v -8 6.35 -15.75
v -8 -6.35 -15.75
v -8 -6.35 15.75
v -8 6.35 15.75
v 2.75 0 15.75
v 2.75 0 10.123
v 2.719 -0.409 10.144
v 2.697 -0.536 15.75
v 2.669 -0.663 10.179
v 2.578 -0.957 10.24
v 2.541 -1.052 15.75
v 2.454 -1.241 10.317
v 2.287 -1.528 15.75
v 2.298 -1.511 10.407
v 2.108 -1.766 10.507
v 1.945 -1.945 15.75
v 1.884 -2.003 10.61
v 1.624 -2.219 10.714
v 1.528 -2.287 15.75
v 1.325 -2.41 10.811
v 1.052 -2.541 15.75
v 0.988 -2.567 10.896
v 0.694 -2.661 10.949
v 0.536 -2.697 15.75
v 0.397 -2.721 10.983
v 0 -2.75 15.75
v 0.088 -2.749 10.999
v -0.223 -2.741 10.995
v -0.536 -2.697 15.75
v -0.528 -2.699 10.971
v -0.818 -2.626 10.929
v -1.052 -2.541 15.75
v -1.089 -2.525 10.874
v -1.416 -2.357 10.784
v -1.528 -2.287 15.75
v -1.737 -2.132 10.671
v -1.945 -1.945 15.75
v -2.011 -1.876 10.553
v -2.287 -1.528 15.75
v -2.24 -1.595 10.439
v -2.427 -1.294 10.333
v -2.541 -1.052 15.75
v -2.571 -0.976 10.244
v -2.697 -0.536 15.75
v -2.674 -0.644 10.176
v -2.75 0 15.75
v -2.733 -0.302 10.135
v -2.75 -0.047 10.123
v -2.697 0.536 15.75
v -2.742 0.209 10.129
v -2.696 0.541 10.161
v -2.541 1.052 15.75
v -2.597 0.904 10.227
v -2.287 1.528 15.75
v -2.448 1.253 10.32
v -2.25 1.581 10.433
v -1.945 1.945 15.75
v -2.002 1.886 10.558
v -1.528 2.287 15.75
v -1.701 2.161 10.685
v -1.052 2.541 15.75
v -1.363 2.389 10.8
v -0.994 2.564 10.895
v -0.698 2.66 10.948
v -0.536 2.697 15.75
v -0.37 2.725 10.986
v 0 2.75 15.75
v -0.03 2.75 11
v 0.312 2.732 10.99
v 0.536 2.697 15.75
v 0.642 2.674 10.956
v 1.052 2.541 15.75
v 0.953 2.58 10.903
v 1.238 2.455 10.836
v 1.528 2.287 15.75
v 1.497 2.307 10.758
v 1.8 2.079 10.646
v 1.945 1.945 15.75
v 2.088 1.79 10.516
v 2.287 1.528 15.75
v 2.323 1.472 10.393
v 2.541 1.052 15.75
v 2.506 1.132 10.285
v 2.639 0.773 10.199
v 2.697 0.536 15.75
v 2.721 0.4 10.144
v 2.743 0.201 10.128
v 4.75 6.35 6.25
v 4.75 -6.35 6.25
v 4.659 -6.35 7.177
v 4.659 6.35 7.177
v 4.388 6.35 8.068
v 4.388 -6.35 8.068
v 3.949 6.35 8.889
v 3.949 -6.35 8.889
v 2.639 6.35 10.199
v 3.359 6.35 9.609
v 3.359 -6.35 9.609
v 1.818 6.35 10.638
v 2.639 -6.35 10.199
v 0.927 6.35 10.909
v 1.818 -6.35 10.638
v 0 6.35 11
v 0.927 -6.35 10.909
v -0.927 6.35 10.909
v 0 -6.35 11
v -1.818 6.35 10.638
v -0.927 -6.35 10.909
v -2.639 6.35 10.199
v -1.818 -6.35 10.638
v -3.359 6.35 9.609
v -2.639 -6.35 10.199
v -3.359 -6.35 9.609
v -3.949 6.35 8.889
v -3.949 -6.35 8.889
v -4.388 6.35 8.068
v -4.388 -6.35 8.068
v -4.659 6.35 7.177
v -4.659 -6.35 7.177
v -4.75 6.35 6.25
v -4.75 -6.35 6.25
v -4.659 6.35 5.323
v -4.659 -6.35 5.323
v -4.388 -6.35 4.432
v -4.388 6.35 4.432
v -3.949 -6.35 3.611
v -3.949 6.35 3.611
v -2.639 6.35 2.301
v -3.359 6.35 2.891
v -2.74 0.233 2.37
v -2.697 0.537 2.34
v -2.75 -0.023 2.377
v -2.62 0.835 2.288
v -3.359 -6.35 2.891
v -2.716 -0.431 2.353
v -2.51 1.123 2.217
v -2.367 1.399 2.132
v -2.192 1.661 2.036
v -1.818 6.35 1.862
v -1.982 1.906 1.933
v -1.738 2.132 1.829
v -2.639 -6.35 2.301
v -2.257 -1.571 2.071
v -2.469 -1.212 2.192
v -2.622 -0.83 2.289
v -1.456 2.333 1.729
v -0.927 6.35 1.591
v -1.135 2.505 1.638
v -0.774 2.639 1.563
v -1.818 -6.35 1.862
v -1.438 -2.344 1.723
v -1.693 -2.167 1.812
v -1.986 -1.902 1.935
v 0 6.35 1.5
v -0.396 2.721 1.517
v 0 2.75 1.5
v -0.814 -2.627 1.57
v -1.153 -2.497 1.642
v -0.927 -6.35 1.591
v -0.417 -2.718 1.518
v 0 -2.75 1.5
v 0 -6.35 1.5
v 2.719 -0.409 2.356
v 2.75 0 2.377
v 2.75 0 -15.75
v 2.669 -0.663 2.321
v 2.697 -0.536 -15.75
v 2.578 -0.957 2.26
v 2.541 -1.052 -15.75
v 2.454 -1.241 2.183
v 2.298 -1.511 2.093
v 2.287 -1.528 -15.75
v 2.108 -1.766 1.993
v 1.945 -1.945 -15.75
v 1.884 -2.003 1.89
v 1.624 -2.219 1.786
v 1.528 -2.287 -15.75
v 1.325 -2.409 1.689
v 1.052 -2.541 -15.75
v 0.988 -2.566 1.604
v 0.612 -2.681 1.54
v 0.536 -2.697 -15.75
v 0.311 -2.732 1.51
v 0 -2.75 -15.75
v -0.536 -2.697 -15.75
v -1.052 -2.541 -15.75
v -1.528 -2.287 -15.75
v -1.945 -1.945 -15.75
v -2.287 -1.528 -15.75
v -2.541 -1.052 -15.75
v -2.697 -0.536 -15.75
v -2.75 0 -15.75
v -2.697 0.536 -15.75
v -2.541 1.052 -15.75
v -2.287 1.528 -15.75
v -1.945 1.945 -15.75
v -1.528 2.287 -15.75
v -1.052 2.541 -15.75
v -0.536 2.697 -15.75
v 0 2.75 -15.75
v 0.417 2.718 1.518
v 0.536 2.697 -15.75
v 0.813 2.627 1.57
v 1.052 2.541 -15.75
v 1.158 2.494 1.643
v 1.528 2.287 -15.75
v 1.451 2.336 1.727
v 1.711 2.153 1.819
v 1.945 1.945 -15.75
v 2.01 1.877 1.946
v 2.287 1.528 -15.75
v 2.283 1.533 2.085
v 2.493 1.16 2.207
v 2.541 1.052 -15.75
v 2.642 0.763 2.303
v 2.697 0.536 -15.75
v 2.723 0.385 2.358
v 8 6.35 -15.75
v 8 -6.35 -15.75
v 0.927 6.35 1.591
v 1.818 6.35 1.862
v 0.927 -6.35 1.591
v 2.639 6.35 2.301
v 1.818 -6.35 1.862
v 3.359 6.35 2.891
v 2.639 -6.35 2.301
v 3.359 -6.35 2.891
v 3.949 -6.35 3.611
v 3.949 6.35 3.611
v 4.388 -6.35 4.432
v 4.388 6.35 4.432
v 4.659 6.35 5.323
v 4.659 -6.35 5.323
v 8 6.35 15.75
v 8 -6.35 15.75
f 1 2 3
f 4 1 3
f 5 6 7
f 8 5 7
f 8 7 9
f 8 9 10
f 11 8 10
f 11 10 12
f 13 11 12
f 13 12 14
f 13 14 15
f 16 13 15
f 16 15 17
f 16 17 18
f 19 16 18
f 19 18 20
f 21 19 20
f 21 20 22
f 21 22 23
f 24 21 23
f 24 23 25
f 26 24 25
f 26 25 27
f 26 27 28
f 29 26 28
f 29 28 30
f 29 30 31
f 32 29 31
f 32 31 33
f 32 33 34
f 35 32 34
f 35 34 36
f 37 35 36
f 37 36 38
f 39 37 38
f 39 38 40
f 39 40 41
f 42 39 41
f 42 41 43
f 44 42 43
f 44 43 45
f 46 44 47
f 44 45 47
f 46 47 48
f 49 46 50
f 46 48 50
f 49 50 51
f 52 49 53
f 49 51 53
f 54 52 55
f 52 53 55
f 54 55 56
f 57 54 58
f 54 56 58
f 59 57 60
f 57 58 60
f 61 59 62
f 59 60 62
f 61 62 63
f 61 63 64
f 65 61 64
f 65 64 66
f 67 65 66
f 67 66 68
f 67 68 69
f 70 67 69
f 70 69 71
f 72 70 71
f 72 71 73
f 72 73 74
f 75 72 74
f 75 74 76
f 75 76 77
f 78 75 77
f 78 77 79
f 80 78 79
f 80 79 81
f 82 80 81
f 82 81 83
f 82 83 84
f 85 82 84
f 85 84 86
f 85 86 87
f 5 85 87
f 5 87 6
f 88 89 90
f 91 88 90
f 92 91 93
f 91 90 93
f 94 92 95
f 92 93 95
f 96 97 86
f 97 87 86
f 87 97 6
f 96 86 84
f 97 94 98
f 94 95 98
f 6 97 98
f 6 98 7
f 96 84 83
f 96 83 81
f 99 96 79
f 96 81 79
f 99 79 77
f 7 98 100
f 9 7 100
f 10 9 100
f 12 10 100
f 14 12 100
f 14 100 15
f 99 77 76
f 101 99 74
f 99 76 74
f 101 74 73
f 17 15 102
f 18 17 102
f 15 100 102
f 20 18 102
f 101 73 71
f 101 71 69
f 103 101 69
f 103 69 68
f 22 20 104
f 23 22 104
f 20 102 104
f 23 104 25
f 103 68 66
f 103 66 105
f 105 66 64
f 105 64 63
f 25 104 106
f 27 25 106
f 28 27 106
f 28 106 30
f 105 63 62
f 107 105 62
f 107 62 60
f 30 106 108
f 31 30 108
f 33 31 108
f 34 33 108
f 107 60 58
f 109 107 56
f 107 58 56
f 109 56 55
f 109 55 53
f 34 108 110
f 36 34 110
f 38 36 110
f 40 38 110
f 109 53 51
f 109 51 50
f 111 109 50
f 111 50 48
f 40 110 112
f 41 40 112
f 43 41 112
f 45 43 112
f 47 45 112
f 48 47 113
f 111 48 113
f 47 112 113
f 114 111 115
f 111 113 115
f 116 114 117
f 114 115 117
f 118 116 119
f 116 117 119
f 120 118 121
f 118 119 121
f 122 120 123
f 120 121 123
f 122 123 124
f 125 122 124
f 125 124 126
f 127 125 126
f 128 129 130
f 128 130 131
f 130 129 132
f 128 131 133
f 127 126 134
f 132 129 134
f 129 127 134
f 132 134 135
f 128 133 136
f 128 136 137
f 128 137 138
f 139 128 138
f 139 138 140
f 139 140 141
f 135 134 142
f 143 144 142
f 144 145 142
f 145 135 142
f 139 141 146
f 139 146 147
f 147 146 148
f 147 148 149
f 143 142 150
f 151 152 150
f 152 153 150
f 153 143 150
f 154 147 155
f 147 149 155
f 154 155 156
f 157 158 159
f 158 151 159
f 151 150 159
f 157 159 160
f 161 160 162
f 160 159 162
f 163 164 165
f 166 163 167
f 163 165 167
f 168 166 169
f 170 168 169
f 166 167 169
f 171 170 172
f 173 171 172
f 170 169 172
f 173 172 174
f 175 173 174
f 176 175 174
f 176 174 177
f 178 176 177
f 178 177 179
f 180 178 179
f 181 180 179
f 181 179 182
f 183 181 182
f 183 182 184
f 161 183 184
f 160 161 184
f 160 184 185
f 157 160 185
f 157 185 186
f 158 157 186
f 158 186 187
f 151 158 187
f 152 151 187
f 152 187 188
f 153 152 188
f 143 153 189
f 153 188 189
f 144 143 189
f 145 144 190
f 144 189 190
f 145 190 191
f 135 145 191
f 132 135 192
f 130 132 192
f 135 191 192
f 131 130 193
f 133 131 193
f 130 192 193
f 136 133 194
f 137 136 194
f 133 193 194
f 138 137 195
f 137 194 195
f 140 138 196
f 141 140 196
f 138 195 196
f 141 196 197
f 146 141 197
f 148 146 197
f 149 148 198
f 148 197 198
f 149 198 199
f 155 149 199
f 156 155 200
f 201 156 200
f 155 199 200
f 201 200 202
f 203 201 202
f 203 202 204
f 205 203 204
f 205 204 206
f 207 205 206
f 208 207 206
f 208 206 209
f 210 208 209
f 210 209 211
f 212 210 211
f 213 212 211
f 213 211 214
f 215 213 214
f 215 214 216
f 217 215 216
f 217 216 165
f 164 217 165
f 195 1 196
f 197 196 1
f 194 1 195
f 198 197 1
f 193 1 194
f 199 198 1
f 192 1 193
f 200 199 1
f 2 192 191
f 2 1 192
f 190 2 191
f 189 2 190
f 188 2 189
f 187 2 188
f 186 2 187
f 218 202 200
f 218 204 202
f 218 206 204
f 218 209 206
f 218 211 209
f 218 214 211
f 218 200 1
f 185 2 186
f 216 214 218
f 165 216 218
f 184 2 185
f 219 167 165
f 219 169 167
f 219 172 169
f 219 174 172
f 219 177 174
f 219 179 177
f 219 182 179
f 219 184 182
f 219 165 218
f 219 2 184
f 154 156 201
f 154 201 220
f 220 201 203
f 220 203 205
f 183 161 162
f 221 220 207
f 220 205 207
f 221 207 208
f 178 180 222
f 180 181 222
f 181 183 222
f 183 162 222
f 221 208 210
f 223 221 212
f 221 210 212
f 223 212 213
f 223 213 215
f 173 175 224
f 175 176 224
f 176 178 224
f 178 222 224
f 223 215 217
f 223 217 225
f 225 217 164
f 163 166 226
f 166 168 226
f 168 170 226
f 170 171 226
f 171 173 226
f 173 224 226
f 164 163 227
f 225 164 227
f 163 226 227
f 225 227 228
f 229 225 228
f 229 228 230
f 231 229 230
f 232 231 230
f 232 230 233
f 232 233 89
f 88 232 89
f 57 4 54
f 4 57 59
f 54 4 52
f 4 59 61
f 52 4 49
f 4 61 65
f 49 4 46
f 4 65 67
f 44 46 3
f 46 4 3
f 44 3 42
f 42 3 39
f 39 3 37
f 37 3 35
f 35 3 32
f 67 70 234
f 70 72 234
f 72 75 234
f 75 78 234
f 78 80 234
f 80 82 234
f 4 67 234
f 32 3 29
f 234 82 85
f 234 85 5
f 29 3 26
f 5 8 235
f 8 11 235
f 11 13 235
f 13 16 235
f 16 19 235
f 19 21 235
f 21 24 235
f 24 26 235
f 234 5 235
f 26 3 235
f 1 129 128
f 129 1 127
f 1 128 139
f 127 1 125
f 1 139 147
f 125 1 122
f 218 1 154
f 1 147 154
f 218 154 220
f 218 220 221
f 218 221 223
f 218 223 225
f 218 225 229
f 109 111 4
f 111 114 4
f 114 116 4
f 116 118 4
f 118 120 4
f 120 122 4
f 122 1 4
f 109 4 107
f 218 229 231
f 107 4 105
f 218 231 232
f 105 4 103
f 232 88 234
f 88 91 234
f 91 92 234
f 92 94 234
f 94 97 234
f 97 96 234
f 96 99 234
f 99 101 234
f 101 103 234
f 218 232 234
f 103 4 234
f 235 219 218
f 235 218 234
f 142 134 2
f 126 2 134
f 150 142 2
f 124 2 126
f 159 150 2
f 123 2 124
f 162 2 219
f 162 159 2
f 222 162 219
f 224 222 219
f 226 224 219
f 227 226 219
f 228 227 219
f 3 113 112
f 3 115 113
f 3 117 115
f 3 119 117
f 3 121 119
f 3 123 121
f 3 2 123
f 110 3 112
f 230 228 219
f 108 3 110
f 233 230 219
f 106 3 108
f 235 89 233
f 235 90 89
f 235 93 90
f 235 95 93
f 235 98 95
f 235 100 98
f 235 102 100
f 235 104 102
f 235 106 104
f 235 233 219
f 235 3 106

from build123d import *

# Parameters (mm, degrees)
F0_W     = 16
F0_H     = 31.5
F1_DEPTH = 6.35
F3_DEPTH = 12.701
F4_R     = 2.75
F5_DEPTH = 31.501


with BuildPart() as f1:
    # F0 (on Front) → F1 (new body, symmetric)
    with BuildSketch(Plane.XZ):
        Rectangle(F0_W, F0_H)
    extrude(amount=F1_DEPTH, both=True)

    # F2 (on face) → F3 (cut, through all)
    with BuildSketch(Plane.XZ.offset(6.35)):
        with BuildLine():
            ThreePointArc((0, 1.5), (3.358757, 2.891243), (4.75, 6.25))
            ThreePointArc((4.75, 6.25), (-3.358757, 9.608757), (0, 1.5))
        make_face()
    extrude(amount=-F3_DEPTH, mode=Mode.SUBTRACT)

    # F4 (on face) → F5 (cut, through all)
    with BuildSketch(Plane(origin=(0, 0, -15.75), x_dir=(1, 0, 0), z_dir=(0, 0, -1))):
        Circle(F4_R)
    extrude(amount=-F5_DEPTH, mode=Mode.SUBTRACT)


solid = f1.part
